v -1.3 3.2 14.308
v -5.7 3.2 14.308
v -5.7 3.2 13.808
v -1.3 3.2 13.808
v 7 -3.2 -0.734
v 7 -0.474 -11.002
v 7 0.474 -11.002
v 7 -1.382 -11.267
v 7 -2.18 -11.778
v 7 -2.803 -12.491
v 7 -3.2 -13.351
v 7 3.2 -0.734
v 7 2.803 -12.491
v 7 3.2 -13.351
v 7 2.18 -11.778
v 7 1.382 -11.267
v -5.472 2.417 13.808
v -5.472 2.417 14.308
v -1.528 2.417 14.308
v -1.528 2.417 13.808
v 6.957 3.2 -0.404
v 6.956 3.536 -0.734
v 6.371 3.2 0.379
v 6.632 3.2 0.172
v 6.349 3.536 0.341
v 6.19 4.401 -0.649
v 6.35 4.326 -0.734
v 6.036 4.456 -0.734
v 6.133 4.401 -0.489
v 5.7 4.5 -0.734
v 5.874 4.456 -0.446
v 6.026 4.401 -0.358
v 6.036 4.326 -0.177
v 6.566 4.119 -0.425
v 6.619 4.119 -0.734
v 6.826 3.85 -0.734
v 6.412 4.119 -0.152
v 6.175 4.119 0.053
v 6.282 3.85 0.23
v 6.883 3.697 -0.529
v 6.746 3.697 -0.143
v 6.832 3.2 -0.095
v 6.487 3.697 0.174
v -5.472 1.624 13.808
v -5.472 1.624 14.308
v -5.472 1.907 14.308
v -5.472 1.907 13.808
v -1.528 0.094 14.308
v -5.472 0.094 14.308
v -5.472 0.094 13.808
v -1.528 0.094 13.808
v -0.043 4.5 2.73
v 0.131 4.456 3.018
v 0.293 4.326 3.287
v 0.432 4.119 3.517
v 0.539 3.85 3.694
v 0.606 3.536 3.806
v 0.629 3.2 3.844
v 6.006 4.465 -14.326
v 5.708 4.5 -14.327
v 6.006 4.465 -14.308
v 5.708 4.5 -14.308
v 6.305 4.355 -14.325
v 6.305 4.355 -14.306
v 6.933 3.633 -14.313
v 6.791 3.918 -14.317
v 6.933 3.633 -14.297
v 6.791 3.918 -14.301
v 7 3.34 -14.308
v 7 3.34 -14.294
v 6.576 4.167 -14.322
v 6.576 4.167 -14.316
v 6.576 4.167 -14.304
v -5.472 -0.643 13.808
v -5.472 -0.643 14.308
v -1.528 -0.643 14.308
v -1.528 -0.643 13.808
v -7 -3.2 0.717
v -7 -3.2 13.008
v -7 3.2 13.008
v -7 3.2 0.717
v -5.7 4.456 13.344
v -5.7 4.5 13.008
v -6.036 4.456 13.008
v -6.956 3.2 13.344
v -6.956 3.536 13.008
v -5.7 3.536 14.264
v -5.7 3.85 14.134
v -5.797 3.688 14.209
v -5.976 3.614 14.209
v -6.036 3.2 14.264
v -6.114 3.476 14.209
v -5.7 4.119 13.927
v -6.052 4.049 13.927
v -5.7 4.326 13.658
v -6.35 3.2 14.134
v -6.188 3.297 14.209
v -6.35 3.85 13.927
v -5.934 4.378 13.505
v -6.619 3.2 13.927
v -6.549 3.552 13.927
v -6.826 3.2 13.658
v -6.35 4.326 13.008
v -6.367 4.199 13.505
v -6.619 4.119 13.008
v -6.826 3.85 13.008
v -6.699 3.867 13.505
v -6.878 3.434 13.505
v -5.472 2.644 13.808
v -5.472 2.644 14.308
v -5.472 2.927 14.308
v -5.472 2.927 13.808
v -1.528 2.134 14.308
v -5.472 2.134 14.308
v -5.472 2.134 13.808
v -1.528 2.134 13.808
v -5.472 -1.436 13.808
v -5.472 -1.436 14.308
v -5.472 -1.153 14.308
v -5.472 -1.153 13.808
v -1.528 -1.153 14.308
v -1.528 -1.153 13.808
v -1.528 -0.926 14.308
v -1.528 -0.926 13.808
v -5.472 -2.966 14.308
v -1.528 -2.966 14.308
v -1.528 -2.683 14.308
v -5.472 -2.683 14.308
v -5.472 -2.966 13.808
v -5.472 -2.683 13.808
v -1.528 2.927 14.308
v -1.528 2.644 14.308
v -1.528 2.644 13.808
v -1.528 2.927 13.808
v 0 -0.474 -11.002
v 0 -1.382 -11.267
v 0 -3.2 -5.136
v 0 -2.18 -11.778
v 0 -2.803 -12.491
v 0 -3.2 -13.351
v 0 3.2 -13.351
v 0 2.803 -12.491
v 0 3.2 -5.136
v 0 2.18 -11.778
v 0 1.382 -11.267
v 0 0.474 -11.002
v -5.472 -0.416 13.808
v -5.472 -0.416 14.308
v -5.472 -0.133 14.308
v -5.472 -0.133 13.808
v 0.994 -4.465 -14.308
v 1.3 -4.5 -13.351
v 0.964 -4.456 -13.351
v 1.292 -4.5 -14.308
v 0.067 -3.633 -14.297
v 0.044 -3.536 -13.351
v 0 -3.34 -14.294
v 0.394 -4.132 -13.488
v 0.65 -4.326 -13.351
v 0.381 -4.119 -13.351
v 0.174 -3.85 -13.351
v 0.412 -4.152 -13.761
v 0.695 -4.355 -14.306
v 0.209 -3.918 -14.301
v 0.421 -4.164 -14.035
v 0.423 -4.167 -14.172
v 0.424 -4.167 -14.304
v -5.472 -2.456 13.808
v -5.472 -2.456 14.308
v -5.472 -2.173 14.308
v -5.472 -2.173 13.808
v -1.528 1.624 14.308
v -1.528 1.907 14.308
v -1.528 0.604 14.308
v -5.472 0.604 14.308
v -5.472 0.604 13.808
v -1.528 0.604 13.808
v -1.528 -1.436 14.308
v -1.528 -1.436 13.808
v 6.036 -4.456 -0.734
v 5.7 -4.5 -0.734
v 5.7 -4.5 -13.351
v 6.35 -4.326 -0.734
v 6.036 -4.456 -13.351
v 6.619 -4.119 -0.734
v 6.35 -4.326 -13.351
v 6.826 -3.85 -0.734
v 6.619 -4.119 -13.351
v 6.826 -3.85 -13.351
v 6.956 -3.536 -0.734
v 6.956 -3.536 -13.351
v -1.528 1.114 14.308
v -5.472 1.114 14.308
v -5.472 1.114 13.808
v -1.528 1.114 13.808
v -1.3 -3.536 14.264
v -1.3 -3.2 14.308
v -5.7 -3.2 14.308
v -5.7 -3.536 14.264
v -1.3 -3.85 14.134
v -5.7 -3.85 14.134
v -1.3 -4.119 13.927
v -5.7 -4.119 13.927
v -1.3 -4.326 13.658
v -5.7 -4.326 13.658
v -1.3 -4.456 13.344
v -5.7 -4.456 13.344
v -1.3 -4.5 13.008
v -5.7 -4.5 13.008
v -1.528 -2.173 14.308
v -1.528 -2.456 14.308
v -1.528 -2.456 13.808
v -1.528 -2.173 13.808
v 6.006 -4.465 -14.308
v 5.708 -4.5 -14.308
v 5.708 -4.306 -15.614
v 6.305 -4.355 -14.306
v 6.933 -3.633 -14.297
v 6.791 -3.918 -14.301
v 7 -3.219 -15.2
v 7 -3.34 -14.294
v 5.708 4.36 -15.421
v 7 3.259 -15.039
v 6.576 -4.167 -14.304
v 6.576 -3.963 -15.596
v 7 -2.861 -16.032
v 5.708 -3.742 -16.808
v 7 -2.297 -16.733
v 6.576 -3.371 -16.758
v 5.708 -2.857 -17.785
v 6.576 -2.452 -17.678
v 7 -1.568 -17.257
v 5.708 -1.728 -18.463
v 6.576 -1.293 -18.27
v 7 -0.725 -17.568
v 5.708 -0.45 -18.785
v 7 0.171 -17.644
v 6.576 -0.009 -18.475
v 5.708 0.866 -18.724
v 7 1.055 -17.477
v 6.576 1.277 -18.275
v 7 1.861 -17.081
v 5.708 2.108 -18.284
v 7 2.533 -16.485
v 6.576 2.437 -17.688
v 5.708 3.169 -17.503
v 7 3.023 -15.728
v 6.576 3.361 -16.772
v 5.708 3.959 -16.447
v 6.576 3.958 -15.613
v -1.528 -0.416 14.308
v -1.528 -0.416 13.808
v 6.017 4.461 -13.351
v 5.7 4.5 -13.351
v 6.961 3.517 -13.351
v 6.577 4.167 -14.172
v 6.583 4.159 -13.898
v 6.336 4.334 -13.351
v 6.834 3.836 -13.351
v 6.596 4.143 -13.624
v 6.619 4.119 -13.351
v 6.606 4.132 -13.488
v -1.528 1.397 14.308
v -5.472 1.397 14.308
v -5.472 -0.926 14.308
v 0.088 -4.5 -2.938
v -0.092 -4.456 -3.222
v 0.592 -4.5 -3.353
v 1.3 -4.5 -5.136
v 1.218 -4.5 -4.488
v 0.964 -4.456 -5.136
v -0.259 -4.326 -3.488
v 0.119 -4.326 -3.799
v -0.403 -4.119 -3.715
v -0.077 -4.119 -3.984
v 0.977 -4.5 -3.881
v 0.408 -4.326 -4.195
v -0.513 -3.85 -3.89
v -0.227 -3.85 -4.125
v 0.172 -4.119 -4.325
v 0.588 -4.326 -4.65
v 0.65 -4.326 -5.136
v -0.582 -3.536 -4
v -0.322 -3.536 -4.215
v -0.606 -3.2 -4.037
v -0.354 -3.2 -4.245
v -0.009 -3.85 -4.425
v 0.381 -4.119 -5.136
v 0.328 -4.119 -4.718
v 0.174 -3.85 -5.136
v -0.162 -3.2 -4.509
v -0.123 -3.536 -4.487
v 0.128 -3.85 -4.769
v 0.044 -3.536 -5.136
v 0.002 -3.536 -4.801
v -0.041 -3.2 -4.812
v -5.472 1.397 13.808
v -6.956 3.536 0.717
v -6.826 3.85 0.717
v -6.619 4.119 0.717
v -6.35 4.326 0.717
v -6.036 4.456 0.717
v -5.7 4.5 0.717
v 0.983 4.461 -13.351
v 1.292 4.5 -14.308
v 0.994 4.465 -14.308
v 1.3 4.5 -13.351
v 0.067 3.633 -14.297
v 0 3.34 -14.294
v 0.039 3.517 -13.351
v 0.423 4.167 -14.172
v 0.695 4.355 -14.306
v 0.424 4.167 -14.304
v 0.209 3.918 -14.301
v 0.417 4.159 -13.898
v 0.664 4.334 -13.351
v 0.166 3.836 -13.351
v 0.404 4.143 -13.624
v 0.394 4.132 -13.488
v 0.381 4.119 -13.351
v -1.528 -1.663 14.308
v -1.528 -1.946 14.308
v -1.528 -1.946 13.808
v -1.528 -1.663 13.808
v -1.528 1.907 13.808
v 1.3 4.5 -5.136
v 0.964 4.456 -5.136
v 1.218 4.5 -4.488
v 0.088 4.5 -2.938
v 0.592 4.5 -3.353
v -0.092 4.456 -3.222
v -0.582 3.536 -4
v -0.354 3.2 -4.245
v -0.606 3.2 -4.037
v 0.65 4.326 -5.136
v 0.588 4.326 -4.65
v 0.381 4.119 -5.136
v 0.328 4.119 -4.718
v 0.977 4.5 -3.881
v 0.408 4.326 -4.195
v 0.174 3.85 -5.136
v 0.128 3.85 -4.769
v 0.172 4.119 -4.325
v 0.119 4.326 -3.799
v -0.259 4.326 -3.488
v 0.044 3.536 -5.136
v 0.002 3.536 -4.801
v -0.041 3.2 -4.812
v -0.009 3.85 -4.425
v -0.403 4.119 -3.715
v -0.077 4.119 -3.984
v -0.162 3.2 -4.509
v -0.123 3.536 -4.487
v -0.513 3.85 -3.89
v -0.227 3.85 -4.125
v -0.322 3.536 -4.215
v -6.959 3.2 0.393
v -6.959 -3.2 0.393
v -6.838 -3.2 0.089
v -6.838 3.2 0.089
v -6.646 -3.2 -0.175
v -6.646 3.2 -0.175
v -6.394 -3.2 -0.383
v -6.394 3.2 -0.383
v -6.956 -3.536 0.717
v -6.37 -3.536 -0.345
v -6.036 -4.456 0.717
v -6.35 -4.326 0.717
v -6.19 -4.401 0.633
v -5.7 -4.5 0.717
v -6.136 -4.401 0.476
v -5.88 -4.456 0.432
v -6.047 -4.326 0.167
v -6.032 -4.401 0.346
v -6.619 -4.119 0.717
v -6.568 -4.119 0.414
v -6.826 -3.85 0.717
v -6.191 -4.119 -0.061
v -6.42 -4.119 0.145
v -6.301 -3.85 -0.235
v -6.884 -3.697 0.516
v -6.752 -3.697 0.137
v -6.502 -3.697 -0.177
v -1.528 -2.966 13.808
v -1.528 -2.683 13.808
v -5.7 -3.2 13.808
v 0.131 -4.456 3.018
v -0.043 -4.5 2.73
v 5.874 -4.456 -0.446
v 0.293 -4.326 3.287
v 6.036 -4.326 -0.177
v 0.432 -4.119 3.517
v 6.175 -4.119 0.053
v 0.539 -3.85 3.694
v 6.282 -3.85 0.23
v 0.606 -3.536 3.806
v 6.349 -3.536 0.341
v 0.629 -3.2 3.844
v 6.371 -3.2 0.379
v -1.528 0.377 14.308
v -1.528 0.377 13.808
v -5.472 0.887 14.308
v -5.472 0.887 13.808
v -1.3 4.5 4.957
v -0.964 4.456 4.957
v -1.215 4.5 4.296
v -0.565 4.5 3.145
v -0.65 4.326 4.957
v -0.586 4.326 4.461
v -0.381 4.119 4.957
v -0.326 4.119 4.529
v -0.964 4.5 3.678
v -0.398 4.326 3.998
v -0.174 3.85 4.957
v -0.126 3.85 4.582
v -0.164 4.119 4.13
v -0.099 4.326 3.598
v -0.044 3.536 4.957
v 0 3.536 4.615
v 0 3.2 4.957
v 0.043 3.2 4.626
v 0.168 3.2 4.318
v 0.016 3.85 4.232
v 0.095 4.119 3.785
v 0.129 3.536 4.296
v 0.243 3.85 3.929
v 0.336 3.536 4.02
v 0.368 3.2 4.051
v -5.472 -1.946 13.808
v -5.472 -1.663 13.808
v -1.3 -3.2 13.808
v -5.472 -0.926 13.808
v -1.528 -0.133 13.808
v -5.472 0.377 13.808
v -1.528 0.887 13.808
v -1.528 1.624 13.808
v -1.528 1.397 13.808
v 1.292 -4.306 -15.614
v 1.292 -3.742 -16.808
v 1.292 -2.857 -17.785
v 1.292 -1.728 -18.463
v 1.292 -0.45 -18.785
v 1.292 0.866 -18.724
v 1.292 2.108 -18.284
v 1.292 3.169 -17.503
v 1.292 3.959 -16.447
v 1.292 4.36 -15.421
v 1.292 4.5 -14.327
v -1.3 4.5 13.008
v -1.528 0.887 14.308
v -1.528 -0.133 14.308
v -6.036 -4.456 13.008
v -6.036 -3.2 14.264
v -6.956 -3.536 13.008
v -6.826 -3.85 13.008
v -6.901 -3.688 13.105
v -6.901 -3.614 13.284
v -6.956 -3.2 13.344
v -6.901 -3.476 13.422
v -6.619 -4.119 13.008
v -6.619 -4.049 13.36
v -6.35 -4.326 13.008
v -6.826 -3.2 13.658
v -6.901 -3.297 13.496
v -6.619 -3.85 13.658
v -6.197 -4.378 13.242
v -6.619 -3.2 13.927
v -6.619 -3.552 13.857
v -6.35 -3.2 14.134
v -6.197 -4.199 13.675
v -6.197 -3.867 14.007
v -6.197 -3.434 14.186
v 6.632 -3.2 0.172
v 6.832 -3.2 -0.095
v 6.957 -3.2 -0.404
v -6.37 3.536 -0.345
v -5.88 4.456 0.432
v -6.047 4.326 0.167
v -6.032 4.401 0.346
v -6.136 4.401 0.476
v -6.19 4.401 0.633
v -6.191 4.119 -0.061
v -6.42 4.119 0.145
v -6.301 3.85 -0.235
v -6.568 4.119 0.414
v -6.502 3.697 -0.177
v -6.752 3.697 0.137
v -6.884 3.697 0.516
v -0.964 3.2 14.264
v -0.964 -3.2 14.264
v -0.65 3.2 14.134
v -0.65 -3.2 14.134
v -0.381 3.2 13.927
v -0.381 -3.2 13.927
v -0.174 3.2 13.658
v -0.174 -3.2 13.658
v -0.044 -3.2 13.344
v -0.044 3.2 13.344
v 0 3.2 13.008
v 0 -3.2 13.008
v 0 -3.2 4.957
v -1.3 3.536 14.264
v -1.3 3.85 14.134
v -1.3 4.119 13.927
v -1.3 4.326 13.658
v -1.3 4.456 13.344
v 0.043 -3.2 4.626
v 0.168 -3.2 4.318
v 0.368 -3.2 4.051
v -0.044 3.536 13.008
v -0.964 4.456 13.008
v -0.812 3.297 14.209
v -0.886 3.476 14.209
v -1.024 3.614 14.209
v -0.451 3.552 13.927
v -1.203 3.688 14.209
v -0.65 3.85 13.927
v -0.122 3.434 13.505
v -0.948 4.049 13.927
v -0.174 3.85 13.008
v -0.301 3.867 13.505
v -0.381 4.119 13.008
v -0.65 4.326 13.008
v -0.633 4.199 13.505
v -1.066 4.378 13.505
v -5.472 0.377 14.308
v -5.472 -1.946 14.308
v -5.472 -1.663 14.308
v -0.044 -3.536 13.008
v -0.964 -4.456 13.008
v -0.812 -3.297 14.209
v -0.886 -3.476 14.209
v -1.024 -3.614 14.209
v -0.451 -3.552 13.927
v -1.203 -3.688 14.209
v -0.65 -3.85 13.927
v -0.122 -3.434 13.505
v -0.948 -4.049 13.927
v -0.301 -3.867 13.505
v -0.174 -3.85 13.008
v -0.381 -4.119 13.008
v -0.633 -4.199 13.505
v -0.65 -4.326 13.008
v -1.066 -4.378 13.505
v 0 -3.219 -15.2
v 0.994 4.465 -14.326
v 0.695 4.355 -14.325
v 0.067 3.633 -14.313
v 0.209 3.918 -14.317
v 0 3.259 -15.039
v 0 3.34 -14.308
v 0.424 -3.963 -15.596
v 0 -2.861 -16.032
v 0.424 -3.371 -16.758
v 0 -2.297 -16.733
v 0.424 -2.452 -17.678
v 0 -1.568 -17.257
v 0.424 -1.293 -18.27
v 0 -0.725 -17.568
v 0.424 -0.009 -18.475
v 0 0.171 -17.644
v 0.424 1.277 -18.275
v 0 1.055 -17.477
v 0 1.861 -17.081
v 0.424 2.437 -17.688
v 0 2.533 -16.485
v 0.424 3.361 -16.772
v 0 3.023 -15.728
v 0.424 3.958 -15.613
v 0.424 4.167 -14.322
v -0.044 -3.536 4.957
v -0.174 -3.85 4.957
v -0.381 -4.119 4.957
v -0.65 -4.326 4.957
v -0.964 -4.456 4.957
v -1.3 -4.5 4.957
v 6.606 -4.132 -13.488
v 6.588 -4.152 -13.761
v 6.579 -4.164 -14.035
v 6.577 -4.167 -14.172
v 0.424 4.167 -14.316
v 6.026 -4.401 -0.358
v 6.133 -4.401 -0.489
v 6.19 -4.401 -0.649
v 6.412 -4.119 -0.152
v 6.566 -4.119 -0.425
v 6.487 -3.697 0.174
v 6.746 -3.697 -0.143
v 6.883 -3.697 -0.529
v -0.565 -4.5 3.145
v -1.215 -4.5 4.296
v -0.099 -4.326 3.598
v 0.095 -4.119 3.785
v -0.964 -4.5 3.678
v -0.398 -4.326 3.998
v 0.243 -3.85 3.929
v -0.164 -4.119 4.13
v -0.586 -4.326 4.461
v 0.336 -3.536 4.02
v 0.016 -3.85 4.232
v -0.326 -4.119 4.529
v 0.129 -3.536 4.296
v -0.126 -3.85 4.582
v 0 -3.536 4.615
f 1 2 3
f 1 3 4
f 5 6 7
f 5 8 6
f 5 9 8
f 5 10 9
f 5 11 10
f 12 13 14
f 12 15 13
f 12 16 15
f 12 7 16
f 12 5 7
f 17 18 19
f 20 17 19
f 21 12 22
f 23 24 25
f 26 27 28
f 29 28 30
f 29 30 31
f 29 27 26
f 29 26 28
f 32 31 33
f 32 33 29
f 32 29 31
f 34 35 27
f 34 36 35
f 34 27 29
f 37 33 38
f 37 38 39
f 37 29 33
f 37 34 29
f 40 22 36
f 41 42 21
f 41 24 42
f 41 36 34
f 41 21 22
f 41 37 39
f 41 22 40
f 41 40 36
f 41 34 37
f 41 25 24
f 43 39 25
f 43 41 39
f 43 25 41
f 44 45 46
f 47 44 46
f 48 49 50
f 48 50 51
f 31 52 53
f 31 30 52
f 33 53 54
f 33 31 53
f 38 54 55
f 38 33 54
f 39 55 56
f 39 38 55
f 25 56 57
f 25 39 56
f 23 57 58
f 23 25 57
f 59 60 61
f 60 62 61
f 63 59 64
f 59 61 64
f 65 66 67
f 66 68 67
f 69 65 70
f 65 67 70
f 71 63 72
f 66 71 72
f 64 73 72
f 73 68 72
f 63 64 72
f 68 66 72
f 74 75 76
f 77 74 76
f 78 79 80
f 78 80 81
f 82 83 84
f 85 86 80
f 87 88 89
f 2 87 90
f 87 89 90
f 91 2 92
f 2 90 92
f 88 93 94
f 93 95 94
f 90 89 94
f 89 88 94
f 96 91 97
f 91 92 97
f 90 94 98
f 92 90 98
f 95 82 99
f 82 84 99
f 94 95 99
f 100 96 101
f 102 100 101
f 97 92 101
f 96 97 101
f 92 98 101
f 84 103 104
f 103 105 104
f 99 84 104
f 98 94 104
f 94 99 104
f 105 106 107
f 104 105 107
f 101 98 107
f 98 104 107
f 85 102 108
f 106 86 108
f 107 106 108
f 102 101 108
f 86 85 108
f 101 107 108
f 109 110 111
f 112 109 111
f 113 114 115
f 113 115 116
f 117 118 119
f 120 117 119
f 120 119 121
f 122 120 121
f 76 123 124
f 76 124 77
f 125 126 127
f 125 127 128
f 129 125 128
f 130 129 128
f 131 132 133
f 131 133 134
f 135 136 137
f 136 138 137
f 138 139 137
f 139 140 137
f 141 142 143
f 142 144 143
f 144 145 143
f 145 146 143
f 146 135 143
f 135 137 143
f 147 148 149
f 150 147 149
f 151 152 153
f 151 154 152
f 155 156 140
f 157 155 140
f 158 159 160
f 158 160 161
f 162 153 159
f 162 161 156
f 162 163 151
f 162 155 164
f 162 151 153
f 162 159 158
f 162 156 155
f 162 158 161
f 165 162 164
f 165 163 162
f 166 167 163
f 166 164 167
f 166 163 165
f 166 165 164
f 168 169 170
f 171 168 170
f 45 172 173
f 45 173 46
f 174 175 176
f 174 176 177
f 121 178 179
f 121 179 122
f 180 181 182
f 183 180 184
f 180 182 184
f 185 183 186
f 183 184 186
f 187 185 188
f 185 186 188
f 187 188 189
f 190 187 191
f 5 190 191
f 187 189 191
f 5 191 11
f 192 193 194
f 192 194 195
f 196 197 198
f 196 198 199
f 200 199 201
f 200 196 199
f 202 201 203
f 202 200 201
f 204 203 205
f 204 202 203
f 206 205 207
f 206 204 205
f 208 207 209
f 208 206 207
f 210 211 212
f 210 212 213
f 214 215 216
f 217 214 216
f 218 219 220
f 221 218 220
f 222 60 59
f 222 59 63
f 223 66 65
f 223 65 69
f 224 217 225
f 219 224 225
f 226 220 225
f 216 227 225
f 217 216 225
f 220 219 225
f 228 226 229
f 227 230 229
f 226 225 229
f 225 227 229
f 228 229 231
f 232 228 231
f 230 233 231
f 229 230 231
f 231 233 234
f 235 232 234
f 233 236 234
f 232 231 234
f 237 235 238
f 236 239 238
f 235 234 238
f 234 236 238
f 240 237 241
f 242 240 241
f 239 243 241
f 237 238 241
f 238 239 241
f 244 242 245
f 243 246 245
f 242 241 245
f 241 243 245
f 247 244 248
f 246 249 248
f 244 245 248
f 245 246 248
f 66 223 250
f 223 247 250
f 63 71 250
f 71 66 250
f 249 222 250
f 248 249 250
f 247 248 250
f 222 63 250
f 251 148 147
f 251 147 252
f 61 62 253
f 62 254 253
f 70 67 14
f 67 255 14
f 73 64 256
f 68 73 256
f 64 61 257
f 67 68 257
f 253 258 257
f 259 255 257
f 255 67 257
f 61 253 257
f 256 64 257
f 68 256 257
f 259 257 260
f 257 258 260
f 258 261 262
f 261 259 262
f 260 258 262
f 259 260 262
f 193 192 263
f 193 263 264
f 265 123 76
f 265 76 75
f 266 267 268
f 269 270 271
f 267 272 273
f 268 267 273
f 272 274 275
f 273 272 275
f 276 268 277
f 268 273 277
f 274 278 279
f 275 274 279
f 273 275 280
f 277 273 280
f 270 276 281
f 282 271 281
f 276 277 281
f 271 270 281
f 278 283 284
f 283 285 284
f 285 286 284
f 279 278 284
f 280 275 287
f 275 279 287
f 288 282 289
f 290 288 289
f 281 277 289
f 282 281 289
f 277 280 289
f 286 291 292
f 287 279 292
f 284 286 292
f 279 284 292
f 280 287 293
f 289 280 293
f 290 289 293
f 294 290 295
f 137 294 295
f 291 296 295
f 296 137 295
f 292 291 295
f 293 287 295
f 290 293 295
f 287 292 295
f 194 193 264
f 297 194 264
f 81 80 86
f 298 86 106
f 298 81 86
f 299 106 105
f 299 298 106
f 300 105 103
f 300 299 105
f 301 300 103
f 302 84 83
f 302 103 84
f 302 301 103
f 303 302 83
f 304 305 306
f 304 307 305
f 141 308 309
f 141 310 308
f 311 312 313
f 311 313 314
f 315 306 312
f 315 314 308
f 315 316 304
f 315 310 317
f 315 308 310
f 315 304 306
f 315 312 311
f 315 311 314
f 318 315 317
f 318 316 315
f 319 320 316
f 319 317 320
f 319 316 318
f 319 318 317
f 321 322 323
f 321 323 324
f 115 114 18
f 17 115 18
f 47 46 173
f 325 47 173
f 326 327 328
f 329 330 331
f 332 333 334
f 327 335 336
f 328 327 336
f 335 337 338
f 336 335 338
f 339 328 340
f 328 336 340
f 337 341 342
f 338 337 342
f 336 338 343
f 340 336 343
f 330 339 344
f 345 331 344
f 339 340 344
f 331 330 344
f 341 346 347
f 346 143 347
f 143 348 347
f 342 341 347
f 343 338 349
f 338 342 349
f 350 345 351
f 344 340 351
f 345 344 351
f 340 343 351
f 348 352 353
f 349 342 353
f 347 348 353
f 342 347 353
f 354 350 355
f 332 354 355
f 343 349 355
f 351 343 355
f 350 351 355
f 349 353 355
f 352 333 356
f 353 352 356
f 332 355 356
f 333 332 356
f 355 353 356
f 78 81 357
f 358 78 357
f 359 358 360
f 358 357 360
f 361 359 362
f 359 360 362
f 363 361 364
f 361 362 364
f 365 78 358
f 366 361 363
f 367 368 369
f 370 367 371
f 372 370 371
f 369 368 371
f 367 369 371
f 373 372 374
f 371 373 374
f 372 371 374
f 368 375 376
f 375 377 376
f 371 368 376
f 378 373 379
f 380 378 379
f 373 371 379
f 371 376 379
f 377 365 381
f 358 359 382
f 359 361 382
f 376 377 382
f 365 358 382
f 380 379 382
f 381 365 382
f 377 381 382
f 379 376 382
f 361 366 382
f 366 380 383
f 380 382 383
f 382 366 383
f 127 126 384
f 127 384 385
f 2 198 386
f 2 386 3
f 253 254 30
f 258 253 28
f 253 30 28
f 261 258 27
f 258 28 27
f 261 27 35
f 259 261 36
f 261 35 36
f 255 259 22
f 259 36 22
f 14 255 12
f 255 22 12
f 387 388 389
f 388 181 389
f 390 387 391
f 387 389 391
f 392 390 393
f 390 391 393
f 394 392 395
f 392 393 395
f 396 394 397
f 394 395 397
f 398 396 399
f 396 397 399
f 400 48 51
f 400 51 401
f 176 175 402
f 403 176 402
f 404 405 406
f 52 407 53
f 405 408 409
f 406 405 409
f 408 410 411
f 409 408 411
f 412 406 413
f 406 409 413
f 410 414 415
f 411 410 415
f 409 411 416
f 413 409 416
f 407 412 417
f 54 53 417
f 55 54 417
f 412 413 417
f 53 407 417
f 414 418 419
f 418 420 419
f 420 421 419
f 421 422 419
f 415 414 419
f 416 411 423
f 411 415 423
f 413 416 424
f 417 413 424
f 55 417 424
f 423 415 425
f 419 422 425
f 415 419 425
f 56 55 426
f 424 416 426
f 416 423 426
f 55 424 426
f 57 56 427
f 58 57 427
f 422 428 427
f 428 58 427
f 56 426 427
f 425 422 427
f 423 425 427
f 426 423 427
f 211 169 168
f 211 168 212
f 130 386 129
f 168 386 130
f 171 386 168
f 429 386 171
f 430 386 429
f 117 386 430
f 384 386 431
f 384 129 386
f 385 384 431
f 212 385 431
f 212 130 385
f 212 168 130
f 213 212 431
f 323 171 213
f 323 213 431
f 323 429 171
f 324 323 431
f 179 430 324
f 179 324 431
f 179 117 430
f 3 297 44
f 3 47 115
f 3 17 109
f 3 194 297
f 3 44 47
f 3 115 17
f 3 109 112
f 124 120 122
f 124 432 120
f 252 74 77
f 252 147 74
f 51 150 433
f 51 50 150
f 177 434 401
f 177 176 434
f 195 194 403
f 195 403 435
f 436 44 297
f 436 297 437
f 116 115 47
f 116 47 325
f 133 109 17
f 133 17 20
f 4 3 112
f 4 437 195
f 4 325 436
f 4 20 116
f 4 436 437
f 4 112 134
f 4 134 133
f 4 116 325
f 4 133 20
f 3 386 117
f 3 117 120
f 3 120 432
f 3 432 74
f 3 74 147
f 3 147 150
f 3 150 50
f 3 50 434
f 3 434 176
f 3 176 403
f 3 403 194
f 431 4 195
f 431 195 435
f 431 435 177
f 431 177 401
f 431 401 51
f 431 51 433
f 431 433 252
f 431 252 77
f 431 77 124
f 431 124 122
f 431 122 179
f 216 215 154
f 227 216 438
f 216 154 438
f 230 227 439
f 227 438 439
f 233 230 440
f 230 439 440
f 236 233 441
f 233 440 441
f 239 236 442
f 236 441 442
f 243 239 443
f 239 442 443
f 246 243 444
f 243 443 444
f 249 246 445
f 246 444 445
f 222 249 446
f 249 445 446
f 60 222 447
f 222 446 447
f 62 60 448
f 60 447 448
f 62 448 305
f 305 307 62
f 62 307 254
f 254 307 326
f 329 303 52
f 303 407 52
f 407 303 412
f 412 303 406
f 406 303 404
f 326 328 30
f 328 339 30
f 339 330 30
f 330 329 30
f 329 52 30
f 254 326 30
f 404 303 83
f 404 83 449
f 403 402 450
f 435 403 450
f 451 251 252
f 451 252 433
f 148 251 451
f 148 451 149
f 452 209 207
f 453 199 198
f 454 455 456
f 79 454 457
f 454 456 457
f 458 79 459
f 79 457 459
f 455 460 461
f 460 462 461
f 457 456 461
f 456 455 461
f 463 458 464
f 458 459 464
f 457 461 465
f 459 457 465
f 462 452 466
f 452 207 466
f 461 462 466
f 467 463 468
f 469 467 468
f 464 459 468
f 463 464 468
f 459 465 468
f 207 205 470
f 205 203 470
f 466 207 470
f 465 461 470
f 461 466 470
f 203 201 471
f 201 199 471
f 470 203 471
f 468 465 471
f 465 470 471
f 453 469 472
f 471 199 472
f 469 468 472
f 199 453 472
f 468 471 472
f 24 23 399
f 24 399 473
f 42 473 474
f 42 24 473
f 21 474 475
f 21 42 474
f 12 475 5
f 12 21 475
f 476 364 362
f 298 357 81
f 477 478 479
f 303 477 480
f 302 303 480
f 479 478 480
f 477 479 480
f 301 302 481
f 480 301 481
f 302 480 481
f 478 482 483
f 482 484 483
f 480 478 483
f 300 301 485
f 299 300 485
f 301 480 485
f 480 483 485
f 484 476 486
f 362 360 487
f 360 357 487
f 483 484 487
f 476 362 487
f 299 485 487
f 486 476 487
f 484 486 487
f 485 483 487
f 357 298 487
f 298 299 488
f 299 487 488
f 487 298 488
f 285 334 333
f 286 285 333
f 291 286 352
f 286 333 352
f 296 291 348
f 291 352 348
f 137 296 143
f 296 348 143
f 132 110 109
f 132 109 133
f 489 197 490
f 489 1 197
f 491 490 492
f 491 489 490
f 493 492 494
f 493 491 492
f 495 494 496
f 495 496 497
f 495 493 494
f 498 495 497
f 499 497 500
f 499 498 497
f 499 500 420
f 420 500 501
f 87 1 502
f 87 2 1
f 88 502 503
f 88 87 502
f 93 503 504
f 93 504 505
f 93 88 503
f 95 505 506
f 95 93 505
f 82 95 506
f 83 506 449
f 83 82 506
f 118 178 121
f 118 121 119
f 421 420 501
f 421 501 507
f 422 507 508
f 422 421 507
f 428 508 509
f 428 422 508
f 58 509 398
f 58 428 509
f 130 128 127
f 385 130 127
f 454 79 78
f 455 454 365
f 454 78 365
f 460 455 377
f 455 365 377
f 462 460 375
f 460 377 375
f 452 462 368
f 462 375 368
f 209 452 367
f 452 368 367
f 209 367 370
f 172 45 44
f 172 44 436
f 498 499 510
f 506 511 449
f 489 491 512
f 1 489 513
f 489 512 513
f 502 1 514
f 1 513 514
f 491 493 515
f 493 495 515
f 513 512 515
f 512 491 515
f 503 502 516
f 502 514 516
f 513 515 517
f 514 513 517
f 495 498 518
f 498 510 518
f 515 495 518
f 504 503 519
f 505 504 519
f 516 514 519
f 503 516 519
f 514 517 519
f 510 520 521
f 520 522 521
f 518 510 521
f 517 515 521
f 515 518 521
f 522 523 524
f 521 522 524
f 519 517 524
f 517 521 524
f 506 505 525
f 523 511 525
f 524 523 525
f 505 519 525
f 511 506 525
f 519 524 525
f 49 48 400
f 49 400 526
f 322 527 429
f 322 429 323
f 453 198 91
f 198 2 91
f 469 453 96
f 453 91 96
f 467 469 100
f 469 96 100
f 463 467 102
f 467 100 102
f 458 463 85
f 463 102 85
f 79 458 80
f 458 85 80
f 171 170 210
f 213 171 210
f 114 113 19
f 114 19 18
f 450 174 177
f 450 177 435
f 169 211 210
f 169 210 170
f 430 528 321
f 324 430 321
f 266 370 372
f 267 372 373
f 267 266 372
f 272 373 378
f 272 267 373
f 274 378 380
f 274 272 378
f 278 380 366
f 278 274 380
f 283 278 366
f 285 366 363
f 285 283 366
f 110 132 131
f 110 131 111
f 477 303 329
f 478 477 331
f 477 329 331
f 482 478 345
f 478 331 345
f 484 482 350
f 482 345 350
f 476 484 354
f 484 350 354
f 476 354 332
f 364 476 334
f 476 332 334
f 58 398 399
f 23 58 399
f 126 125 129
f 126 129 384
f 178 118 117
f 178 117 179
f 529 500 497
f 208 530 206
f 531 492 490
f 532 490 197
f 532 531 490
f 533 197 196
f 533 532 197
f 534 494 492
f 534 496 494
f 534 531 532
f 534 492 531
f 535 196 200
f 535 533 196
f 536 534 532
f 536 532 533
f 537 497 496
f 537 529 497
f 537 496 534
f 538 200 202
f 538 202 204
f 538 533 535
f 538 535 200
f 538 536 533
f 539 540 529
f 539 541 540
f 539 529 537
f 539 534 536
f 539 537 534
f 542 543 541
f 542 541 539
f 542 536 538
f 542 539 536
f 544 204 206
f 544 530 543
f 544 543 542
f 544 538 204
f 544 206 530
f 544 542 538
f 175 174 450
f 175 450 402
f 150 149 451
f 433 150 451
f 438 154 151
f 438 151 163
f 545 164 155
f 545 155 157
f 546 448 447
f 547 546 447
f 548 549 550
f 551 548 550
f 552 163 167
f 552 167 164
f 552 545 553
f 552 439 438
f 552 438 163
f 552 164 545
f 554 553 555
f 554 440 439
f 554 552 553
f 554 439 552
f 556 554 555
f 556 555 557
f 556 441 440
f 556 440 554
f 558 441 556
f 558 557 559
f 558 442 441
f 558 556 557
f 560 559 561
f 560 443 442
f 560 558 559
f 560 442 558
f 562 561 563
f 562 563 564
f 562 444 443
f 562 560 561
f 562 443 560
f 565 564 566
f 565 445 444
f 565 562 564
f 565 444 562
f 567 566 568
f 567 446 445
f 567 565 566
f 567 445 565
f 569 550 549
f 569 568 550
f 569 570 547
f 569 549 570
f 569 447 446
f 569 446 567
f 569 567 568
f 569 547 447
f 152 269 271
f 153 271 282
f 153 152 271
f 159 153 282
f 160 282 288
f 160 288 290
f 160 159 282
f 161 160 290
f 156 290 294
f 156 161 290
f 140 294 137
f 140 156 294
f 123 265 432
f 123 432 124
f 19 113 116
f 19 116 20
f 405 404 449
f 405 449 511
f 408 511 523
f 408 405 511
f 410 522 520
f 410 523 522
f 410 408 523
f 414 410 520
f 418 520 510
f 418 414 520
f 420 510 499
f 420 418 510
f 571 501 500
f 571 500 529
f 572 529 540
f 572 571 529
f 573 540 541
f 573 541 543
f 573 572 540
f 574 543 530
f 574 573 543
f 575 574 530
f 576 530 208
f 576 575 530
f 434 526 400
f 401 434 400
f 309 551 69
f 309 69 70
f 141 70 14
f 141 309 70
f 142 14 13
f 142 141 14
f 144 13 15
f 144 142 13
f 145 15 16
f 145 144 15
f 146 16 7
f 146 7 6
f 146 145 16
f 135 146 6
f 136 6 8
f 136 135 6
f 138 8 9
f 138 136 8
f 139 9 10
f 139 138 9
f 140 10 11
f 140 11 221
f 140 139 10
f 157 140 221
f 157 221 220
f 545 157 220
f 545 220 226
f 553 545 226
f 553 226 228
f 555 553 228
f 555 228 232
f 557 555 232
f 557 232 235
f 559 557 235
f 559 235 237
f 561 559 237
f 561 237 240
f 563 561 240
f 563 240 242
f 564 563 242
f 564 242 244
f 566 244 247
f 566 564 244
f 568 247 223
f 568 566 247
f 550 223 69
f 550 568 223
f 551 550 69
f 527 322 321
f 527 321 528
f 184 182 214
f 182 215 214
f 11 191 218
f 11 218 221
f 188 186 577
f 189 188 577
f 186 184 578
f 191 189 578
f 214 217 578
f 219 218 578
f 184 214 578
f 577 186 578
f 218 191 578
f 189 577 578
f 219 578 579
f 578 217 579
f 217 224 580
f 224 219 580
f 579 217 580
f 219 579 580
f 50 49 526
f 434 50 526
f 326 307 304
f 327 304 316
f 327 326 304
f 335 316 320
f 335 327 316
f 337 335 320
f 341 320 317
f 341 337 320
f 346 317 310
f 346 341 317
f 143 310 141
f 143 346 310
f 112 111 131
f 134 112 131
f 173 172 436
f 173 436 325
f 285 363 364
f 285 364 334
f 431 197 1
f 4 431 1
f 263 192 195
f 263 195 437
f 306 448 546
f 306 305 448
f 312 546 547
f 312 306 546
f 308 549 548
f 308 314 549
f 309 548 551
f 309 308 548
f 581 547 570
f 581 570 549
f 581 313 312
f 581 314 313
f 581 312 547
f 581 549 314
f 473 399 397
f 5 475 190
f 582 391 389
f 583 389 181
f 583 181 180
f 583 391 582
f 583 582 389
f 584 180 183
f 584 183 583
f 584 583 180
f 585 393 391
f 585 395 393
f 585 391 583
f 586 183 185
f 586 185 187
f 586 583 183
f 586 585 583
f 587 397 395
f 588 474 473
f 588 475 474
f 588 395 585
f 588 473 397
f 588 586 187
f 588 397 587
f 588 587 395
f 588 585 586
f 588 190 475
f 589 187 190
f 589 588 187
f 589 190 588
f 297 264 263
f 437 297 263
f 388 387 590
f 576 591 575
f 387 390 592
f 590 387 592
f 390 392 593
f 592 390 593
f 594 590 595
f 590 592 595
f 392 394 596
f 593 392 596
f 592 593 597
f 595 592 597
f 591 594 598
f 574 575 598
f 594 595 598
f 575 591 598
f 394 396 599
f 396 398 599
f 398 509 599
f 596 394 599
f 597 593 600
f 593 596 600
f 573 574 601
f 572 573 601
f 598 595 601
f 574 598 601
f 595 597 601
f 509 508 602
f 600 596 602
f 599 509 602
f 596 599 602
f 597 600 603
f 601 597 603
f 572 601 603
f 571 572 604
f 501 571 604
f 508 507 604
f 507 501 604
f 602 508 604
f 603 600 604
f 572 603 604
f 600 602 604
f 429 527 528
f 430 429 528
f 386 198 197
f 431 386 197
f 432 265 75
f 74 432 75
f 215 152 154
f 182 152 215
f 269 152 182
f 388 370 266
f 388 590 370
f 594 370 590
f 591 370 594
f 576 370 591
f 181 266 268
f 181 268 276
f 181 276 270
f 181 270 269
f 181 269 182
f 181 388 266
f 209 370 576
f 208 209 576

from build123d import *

# Parameters (mm, degrees)
F0_R     = 3.34
F1_DEPTH = 7
F3_DEPTH = 9
F4_DEPTH = 9.001
F5_R     = 1.3
F6_W     = 3.9447422773
F6_H     = 0.2829339355
F6_W_2   = 4.4
F6_H_2   = 6.4
F7_DEPTH = 0.5


# Not quite as in the source:
# - a feature names something its author has since deleted; it is built from what else it names


with BuildPart() as f1:
    # F0 (on Right) → F1 (new body)
    with BuildSketch(Plane.YZ):
        with BuildLine():
            Line((4.5, -14.3079506601), (4.5, 14.3079506601))
            Line((4.5, 14.3079506601), (-4.5, 14.3079506601))
            Line((-4.5, 14.3079506601), (-4.5, -14.3079506601))
            ThreePointArc((-4.5, -14.3079506601), (0, -18.8079506601), (4.5, -14.3079506601))
        make_face()
        with Locations((0, -14.3079506601)):
            Circle(F0_R, mode=Mode.SUBTRACT)
    extrude(amount=F1_DEPTH)

    # F2 (on face) → F3 (join)
    with BuildSketch(Plane.XZ.offset(4.5)):
        Polygon((0, 4.22267057), (0, 14.3079506601), (-7, 14.3079506601), (-7, 0), (0, -4.4198017567), align=None)
    extrude(amount=-F3_DEPTH)

    # F2 (on face) → F4 (cut, through all)
    with BuildSketch(Plane.XZ.offset(4.5)):
        Polygon((7, 14.3079506601), (0, 14.3079506601), (0, 4.22267057), (7, 0), align=None)
    extrude(amount=-F4_DEPTH, mode=Mode.SUBTRACT)

    # F5
    f5_edges = [f1.edges().sort_by_distance(p)[0] for p in [
        (0, -4.5, 9.265311),
        (0, 0, 4.222671),
        (0, 4.5, 9.265311),
        (0, 0, 14.307951),
        (3.5, -4.5, 2.111335),
        (-3.5, -4.5, 14.307951),
        (-7, -4.5, 7.153975),
        (-3.5, -4.5, -2.209901),
        (0, -4.5, -9.363876),
        (3.5, -4.5, -14.307951),
        (7, -4.5, -7.153975),
        (0, 4.5, -9.363876),
        (-3.5, 4.5, -2.209901),
        (-7, 4.5, 7.153975),
        (-3.5, 4.5, 14.307951),
        (3.5, 4.5, 2.111335),
        (7, 4.5, -7.153975),
        (3.5, 4.5, -14.307951),
        (-7, 0, 14.307951),
        (-7, 0, 0),
        (7, 0, 0),
        (0, 0, -4.419802),
    ]]
    fillet(f5_edges, radius=F5_R)

    # F6 (on face) → F7 (cut)
    with BuildSketch(Plane.XY.offset(14.3079506601)):
        with Locations((46.5, 2.275798656)):
            Rectangle(F6_W, F6_H)
        with Locations((46.5, 0.2357986942)):
            Rectangle(F6_W, F6_H)
        with Locations((46.5, -1.8042012677)):
            Rectangle(F6_W, F6_H)
        with Locations((46.5, 0.7457986847)):
            Rectangle(F6_W, F6_H)
        with Locations((46.5, 1.2557986751)):
            Rectangle(F6_W, F6_H)
        with Locations((46.5, -2.3142012581)):
            Rectangle(F6_W, F6_H)
        with Locations((46.5, 2.7857986465)):
            Rectangle(F6_W, F6_H)
        with Locations((46.5, -0.2742012963)):
            Rectangle(F6_W, F6_H)
        with Locations((46.5, -1.2942012772)):
            Rectangle(F6_W, F6_H)
        with Locations((46.5, 1.7657986656)):
            Rectangle(F6_W, F6_H)
        with Locations((46.5, -0.7842012867)):
            Rectangle(F6_W, F6_H)
        with Locations((46.5, -2.8242012486)):
            Rectangle(F6_W, F6_H)
        with Locations((-3.5, 0)):
            Rectangle(F6_W_2, F6_H_2)
        with Locations((-3.5, -2.8242012486)):
            Rectangle(F6_W, F6_H, mode=Mode.SUBTRACT)
        with Locations((-3.5, -2.3142012581)):
            Rectangle(F6_W, F6_H, mode=Mode.SUBTRACT)
        with Locations((-3.5, -1.8042012677)):
            Rectangle(F6_W, F6_H, mode=Mode.SUBTRACT)
        with Locations((-3.5, -1.2942012772)):
            Rectangle(F6_W, F6_H, mode=Mode.SUBTRACT)
        with Locations((-3.5, -0.7842012867)):
            Rectangle(F6_W, F6_H, mode=Mode.SUBTRACT)
        with Locations((-3.5, -0.2742012963)):
            Rectangle(F6_W, F6_H, mode=Mode.SUBTRACT)
        with Locations((-3.5, 0.2357986942)):
            Rectangle(F6_W, F6_H, mode=Mode.SUBTRACT)
        with Locations((-3.5, 0.7457986847)):
            Rectangle(F6_W, F6_H, mode=Mode.SUBTRACT)
        with Locations((-3.5, 1.2557986751)):
            Rectangle(F6_W, F6_H, mode=Mode.SUBTRACT)
        with Locations((-3.5, 1.7657986656)):
            Rectangle(F6_W, F6_H, mode=Mode.SUBTRACT)
        with Locations((-3.5, 2.275798656)):
            Rectangle(F6_W, F6_H, mode=Mode.SUBTRACT)
        with Locations((-3.5, 2.7857986465)):
            Rectangle(F6_W, F6_H, mode=Mode.SUBTRACT)
    extrude(amount=-F7_DEPTH, mode=Mode.SUBTRACT)


solid = f1.part
